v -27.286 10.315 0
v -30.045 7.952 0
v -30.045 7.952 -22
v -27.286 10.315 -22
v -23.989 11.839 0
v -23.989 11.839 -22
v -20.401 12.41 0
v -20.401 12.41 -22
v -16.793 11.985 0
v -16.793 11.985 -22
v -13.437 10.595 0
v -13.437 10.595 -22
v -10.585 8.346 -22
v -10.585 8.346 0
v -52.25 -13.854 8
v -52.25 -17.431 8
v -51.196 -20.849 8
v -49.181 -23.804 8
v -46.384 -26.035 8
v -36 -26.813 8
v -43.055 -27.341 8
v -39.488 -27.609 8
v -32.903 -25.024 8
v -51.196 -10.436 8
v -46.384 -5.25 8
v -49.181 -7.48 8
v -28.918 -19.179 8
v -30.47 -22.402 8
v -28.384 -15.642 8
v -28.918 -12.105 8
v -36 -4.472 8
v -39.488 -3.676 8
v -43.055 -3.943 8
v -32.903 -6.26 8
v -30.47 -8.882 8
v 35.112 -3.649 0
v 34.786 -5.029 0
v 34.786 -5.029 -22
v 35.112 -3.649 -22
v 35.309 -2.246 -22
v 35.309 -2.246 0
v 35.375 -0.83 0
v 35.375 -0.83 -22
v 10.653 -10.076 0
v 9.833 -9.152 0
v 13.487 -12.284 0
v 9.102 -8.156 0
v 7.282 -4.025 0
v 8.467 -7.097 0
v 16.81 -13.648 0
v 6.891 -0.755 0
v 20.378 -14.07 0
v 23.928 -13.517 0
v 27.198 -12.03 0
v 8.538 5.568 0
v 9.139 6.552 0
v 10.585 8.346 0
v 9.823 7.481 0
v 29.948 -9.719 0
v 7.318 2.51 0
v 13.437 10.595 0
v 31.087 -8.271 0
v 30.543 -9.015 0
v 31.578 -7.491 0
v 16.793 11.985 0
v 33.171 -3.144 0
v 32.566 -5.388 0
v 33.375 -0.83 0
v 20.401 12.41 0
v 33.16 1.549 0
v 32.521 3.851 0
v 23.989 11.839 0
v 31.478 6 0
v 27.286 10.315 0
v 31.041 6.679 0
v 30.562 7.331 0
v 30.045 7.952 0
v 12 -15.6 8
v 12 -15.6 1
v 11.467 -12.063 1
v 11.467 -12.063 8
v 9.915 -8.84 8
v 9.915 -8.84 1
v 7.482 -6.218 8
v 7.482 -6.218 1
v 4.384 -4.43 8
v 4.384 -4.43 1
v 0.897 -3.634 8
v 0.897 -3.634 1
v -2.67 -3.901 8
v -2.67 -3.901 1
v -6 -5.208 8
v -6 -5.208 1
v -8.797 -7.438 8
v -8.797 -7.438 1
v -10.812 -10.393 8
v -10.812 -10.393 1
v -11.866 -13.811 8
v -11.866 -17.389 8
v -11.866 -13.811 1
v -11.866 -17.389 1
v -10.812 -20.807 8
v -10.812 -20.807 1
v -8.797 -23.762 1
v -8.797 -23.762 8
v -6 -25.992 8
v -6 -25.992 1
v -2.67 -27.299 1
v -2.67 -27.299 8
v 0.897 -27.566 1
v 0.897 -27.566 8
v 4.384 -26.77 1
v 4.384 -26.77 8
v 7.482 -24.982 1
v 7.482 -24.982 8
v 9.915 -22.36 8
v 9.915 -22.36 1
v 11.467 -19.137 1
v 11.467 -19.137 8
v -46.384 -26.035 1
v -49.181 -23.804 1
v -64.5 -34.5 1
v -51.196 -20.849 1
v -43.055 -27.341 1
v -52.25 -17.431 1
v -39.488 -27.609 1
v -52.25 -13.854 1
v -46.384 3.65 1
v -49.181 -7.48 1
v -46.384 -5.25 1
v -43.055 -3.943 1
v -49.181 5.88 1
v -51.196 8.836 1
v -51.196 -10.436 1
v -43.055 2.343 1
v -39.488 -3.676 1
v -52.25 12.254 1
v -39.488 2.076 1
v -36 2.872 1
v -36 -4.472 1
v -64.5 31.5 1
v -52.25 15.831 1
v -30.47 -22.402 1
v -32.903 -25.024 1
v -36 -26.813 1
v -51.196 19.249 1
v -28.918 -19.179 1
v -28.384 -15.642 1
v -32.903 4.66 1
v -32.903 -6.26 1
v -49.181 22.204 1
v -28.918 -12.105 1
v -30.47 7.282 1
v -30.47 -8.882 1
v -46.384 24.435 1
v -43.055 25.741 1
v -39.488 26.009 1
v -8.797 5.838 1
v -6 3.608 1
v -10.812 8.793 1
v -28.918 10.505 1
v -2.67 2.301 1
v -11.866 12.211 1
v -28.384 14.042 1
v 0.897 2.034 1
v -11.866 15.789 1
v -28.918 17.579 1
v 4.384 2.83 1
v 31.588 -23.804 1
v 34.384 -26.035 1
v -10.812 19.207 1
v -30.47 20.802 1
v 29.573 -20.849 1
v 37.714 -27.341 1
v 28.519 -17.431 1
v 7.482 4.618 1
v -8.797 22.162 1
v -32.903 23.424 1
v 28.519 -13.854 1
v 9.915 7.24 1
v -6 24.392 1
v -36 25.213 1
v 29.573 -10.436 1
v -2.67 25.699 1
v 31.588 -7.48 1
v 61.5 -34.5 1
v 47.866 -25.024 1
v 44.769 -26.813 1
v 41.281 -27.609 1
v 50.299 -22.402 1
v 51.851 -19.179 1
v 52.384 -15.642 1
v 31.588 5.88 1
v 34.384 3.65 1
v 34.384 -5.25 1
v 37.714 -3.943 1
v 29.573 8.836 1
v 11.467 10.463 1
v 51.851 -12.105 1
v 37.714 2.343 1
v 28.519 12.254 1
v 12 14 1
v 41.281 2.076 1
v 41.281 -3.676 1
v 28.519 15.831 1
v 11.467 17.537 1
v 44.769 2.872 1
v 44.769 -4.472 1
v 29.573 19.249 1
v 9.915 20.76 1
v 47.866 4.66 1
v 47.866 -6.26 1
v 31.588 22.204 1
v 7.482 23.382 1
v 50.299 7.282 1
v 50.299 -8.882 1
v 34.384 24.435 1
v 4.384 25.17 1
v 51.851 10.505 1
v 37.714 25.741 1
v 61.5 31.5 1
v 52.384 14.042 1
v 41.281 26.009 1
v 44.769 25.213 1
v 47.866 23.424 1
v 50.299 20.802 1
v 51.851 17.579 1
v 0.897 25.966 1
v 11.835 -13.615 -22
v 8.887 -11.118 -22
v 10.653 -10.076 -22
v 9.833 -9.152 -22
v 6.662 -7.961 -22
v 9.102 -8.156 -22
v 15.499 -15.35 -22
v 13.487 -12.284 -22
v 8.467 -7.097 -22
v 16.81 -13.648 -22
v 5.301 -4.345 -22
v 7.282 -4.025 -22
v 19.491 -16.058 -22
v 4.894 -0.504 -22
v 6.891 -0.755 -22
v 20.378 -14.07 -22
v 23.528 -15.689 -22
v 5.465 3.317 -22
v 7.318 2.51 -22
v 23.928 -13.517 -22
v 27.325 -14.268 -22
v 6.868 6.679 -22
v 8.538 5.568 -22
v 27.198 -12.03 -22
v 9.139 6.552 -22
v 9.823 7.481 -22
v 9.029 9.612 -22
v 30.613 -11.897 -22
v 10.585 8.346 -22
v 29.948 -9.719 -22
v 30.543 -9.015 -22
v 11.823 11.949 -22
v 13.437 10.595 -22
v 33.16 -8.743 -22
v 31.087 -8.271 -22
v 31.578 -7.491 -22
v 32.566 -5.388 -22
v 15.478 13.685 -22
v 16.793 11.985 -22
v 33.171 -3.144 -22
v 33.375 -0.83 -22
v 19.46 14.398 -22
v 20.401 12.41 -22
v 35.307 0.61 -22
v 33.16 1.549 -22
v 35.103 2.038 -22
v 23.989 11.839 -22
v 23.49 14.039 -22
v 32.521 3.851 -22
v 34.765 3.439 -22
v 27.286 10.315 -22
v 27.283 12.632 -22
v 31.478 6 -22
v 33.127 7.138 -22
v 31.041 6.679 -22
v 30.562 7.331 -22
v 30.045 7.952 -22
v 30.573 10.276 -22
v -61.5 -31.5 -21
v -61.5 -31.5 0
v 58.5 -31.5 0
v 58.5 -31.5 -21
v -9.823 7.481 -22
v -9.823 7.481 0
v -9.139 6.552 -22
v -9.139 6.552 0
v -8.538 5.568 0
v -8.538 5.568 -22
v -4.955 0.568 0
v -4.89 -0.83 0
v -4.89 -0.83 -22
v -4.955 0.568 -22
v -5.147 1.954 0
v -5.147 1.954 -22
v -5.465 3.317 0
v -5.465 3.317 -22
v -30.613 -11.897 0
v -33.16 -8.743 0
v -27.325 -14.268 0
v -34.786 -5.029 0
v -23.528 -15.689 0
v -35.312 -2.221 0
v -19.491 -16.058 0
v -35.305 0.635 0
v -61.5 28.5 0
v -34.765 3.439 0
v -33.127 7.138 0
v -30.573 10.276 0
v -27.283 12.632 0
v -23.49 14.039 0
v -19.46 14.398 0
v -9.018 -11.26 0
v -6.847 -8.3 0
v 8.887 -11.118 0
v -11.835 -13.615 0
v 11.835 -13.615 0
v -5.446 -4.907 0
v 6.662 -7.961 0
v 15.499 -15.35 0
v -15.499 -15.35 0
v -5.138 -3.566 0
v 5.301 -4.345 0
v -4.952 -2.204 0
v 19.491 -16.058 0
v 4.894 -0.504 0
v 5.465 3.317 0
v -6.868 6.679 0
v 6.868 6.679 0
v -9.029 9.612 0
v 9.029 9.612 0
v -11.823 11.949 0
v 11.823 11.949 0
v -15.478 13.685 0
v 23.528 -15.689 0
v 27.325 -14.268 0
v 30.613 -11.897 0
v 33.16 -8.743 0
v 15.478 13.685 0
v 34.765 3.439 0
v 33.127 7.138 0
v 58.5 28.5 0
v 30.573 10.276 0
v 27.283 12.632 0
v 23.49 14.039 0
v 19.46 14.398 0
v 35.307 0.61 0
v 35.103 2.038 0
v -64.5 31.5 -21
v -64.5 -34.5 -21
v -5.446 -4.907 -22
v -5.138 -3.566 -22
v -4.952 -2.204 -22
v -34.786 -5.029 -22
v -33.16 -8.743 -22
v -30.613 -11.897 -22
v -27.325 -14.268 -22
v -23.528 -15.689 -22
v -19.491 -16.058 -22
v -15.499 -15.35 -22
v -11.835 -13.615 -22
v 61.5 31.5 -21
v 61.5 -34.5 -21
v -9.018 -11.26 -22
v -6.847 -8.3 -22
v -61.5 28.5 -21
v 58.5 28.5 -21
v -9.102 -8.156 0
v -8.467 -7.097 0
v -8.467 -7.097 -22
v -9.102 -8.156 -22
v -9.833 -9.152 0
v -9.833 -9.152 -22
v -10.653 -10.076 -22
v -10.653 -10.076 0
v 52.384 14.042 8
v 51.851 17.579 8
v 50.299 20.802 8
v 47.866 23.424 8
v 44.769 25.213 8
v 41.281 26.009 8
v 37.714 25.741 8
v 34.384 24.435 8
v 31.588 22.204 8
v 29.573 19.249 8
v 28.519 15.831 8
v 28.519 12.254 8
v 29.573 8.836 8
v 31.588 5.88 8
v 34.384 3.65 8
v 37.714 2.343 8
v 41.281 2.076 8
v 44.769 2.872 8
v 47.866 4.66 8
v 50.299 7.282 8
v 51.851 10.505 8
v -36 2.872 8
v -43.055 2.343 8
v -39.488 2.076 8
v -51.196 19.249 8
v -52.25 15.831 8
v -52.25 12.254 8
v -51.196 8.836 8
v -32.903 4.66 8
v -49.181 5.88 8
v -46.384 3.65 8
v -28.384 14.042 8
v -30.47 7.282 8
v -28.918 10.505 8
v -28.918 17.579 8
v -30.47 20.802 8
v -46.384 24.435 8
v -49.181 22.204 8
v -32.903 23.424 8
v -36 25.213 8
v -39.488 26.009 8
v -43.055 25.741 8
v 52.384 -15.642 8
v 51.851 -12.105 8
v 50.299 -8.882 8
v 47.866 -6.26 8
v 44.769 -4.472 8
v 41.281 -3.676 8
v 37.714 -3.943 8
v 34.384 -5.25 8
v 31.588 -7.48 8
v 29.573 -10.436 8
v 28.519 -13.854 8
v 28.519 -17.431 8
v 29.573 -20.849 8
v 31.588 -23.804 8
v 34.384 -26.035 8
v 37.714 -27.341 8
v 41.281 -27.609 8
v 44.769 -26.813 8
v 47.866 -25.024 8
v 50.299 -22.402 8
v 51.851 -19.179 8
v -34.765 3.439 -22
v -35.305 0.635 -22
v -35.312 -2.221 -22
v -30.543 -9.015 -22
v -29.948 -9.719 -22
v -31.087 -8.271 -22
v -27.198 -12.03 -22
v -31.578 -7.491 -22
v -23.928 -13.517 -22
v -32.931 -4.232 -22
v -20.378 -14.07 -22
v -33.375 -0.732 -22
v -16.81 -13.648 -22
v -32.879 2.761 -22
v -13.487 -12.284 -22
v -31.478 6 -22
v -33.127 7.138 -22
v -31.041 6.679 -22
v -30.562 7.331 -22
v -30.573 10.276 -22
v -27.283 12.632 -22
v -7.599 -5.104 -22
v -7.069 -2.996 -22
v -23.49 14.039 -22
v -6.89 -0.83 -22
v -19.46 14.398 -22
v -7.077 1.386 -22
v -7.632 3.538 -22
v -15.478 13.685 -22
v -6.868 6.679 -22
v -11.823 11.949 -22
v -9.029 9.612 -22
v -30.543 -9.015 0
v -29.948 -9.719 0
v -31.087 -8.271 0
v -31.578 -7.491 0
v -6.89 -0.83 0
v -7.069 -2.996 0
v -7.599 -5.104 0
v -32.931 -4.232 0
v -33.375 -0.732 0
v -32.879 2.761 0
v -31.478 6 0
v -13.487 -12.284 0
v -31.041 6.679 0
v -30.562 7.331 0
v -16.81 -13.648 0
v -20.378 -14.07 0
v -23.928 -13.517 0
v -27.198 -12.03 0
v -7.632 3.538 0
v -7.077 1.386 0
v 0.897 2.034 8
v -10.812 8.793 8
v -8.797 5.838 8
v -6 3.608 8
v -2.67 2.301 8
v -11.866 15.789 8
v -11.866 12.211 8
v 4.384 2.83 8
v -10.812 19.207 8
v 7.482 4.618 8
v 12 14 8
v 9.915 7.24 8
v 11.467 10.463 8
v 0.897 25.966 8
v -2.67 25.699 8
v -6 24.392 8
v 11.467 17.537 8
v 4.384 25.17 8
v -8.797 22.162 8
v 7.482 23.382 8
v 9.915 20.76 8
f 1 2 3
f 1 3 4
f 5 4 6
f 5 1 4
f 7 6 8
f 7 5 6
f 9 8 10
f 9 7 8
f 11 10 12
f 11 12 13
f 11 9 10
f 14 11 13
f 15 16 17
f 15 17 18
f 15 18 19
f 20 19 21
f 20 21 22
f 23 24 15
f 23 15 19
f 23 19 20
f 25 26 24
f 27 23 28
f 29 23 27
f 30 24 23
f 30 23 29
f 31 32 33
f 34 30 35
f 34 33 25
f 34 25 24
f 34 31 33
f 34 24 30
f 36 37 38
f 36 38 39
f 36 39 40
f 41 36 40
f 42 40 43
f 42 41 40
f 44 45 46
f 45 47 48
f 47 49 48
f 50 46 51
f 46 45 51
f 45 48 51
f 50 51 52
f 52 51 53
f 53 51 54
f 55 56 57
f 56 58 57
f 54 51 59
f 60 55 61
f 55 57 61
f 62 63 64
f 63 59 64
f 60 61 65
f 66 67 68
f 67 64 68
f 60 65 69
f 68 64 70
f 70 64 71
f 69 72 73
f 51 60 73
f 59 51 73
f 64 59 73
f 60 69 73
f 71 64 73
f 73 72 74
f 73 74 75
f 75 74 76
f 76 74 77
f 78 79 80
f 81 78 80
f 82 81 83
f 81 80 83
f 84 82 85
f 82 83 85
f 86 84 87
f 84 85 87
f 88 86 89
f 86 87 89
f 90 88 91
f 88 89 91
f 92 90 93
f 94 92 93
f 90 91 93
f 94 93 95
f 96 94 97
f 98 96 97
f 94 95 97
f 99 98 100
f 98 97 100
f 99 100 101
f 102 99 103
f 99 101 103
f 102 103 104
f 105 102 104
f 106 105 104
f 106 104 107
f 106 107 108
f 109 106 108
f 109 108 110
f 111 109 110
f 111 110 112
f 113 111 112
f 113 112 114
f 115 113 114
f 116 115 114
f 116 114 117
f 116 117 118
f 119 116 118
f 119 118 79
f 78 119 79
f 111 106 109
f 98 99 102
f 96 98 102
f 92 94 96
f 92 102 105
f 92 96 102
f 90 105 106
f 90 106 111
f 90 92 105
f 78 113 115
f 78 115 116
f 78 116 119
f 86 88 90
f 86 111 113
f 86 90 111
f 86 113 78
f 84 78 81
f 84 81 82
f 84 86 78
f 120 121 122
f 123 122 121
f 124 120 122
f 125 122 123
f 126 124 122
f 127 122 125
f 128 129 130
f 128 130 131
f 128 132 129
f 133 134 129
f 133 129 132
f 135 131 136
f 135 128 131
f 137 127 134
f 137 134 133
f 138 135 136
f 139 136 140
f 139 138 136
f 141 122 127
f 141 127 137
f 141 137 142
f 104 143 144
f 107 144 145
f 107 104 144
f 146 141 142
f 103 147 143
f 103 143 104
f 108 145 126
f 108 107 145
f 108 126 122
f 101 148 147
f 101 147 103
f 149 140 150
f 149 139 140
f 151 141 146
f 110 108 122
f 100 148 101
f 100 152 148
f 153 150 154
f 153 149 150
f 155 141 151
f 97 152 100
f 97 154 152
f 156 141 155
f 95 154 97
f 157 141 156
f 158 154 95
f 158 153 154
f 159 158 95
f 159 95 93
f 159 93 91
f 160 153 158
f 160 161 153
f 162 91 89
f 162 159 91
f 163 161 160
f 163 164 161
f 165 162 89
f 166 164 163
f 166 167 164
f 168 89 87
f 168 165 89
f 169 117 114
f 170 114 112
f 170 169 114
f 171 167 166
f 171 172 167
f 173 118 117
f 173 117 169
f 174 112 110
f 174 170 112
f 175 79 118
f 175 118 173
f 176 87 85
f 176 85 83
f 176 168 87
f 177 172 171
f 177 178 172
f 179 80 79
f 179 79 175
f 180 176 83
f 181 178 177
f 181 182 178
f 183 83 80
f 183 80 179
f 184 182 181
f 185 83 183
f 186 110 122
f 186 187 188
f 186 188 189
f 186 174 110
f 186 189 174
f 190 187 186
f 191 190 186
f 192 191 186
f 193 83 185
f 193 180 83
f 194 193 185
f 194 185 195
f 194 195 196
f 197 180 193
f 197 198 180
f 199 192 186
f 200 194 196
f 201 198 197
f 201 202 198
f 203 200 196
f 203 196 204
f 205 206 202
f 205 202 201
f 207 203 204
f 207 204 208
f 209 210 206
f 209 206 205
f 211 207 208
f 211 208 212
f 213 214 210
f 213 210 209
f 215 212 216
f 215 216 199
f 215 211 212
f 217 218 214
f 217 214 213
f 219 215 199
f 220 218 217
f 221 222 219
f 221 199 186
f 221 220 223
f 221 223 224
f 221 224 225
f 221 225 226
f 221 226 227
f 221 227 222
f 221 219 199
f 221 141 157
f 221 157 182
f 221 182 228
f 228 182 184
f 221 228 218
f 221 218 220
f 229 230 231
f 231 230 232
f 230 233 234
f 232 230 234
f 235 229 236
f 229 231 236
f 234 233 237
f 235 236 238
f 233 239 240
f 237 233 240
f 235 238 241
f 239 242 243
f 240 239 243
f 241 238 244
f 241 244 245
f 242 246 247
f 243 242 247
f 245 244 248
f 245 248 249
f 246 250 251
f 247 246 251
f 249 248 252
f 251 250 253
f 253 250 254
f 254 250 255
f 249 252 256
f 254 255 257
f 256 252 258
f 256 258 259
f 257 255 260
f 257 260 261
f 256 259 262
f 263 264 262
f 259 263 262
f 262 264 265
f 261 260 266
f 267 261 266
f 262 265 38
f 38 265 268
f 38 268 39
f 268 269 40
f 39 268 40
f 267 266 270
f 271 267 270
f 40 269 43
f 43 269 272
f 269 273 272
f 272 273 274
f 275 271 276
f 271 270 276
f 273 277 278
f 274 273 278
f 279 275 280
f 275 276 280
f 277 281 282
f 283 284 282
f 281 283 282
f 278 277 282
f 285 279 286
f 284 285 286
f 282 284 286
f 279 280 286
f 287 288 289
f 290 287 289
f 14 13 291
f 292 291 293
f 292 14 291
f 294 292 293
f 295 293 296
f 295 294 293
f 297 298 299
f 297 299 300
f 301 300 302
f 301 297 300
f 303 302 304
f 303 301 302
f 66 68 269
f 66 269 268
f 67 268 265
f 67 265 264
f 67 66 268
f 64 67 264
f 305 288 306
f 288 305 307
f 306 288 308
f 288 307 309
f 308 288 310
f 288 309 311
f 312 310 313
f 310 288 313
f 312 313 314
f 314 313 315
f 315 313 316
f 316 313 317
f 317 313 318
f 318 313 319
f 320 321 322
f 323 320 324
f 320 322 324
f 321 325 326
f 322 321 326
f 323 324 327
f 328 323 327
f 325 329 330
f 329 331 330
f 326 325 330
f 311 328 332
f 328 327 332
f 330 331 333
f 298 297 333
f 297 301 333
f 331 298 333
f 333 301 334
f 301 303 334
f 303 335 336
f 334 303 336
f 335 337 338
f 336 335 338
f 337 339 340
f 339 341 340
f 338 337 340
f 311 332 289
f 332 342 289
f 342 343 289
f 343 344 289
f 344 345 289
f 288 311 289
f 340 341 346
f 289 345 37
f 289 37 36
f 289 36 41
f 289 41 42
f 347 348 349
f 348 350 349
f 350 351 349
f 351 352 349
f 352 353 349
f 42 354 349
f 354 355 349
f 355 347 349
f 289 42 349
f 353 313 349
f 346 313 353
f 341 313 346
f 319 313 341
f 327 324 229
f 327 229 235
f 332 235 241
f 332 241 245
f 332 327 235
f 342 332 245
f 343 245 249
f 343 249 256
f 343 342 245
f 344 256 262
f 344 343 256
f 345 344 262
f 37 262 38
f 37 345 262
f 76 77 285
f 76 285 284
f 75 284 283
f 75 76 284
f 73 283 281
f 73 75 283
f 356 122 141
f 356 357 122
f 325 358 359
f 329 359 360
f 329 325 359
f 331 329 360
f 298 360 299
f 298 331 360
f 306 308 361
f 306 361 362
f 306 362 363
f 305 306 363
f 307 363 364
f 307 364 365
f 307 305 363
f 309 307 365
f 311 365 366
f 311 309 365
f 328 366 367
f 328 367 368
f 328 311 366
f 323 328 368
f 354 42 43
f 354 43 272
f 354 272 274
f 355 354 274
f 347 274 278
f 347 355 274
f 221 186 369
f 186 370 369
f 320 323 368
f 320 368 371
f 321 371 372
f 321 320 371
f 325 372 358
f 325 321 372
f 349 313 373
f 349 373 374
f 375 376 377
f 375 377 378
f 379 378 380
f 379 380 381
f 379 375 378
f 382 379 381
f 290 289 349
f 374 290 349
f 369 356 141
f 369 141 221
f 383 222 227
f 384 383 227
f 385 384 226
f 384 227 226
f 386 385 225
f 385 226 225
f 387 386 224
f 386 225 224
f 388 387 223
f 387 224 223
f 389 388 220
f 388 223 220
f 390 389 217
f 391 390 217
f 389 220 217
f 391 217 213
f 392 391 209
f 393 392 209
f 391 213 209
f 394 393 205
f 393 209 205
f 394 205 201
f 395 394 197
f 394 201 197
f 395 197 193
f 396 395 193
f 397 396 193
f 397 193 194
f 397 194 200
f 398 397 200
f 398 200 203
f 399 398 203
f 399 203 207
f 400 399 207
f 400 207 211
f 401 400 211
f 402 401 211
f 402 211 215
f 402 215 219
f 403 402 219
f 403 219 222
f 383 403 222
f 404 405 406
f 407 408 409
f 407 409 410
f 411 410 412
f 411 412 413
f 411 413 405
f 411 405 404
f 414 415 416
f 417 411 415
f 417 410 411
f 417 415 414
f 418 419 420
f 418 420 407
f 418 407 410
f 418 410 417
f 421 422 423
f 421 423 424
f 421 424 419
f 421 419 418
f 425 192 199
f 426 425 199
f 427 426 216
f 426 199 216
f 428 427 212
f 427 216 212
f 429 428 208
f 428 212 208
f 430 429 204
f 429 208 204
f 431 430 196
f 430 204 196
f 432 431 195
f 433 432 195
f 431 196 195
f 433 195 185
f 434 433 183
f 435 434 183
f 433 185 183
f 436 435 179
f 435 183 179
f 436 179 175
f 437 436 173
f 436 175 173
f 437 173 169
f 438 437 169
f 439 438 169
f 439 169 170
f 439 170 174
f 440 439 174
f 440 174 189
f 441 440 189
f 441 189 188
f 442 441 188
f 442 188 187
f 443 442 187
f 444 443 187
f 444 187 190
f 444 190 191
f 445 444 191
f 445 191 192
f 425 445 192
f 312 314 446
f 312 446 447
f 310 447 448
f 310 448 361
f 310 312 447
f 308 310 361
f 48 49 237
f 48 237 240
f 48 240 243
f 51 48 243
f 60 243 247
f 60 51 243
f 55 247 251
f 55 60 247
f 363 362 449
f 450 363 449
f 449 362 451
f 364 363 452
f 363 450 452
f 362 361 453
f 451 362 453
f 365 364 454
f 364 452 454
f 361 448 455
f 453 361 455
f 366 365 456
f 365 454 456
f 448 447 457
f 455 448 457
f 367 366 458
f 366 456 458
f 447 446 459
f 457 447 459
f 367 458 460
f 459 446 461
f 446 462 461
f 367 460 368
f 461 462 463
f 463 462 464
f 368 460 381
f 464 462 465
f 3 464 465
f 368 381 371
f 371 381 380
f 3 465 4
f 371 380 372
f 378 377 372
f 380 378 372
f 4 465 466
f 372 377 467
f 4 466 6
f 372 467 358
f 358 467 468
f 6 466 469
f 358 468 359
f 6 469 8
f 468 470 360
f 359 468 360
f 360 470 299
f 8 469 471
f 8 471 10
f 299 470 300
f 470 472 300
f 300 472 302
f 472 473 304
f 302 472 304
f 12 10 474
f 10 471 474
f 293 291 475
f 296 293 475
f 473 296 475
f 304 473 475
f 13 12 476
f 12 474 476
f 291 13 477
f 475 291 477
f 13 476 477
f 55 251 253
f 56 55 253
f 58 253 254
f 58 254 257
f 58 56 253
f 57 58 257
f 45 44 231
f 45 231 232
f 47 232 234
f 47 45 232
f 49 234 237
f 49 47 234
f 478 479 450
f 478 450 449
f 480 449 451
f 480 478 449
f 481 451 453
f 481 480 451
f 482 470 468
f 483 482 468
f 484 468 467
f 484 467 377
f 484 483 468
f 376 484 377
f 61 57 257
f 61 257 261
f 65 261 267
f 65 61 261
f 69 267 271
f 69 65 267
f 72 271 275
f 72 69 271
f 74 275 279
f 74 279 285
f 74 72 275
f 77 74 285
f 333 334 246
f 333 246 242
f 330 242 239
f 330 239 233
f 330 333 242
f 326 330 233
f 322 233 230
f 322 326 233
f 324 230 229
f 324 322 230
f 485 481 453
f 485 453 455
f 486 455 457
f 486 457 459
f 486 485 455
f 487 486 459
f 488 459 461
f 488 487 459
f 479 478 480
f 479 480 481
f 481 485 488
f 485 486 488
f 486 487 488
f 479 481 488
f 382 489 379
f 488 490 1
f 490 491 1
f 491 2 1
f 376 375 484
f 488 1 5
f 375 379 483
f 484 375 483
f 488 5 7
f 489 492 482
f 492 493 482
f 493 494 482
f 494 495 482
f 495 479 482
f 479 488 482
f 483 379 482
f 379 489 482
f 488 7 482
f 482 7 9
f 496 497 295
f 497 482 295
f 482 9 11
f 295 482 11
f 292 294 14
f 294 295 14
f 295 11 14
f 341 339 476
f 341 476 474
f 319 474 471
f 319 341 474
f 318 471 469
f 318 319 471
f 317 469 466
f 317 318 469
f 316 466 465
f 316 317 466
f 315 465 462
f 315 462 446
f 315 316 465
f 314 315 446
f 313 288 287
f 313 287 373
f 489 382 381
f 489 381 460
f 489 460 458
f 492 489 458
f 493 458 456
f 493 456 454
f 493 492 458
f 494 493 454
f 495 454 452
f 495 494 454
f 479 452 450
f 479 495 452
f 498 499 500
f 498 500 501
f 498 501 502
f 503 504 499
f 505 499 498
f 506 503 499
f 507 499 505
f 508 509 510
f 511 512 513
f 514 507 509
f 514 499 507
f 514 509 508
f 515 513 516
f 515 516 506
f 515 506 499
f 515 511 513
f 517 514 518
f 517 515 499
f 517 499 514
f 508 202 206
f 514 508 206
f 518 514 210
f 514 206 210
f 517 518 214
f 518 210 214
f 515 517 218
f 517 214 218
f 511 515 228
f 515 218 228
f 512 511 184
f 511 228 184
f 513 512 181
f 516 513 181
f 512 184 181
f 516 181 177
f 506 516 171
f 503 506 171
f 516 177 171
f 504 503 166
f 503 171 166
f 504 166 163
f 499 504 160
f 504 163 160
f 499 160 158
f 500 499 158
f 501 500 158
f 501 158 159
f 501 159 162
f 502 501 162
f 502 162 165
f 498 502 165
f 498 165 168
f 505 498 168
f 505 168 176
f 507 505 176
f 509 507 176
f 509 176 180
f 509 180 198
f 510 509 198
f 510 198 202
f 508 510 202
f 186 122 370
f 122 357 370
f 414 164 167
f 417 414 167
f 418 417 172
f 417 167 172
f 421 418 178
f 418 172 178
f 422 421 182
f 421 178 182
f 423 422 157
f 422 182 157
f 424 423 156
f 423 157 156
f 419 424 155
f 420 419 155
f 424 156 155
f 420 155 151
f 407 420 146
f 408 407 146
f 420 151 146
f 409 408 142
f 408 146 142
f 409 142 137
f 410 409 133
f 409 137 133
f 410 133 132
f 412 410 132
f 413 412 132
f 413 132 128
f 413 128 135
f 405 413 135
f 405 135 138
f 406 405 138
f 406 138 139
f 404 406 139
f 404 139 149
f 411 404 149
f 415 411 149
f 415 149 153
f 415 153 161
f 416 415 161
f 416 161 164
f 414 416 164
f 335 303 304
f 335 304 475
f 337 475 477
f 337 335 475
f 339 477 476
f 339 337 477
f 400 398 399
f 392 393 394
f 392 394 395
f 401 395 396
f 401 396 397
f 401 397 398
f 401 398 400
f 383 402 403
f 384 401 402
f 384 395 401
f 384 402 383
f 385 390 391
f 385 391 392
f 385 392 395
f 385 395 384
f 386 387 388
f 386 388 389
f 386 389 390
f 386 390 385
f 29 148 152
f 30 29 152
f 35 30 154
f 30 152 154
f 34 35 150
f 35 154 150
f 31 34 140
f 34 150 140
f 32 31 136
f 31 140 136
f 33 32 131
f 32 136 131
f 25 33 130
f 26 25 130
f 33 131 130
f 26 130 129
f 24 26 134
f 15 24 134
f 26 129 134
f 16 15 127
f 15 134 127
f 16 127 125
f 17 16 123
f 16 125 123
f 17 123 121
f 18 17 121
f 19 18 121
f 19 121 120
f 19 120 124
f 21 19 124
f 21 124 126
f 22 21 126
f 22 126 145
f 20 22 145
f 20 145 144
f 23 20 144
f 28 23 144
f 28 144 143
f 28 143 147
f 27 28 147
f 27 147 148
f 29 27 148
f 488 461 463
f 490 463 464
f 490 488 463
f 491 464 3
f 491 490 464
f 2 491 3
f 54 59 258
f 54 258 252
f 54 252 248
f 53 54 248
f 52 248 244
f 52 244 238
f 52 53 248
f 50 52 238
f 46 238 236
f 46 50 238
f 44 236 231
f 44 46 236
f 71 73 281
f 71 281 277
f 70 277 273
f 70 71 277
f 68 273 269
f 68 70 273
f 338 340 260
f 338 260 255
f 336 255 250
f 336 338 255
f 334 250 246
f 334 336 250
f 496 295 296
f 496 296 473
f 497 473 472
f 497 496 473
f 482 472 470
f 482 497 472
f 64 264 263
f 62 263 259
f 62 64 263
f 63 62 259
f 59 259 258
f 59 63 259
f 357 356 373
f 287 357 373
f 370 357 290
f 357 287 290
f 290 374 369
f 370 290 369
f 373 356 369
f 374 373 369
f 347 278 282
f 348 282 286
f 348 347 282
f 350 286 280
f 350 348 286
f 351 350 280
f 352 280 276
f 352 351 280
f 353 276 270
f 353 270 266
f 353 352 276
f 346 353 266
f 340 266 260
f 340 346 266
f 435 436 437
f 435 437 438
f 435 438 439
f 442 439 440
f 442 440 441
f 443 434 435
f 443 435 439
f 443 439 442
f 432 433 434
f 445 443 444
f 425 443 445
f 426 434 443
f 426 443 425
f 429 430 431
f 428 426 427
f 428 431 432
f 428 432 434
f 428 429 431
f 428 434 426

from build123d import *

# Parameters (mm, degrees)
F0_W     = 126
F0_H     = 66
F0_W_2   = 120
F0_H_2   = 60
F1_DEPTH = 21
F2_W     = 126
F2_H     = 66
F3_DEPTH = 1
F0_R     = 12
F4_DEPTH = 8
F6_DEPTH = 22


with BuildPart() as f1:
    # F0 (on Top) → F1 (new body)
    with BuildSketch(Plane.XY):
        with Locations((-1.5, -1.5)):
            Rectangle(F0_W, F0_H)
        with Locations((-1.5, -1.5)):
            Rectangle(F0_W_2, F0_H_2, mode=Mode.SUBTRACT)
    extrude(amount=-F1_DEPTH)

    # F2 (on face) → F3 (join)
    with BuildSketch(Plane.XY):
        with Locations((-1.5, -1.5)):
            Rectangle(F2_W, F2_H)
    extrude(amount=F3_DEPTH)

    # F0 (on Top) → F4 (join)
    with BuildSketch(Plane.XY):
        with Locations((-40.3844975889, 14.0422494113)):
            Circle(F0_R)
        with Locations((0, 14)):
            Circle(F0_R)
        with Locations((-40.3844975889, -15.6422494113)):
            Circle(F0_R)
        with Locations((0, -15.6)):
            Circle(F0_R)
        with Locations((40.3844975889, -15.6422494113)):
            Circle(F0_R)
        with Locations((40.3844975889, 14.0422494113)):
            Circle(F0_R)
    extrude(amount=F4_DEPTH)

    # F5 (on face) → F6 (join)
    with BuildSketch(Plane.XY):
        with BuildLine():
            ThreePointArc((31.4784805761, 5.99968384), (32.8922690999, 2.7143222033), (33.3752768321, -0.8295602165))
            ThreePointArc((33.3752768321, -0.8295602165), (32.9180007232, -4.2794585958), (31.5777529034, -7.4910993057))
            ThreePointArc((31.5777529034, -7.4910993057), (33.0771463209, -6.123708691), (34.7855065256, -5.0285177832))
            ThreePointArc((34.7855065256, -5.0285177832), (35.2271141548, -2.9496471052), (35.3752768321, -0.8295602165))
            ThreePointArc((35.3752768321, -0.8295602165), (35.2220188743, 1.3264920966), (34.7653269231, 3.4391875409))
            ThreePointArc((34.7653269231, 3.4391875409), (33.0099261031, 4.57569273), (31.4784805761, 5.99968384))
        make_face()
        with BuildLine():
            ThreePointArc((30.044931449, 7.9518165828), (30.8064288175, 7.0085924135), (31.4784805761, 5.99968384))
            ThreePointArc((31.4784805761, 5.99968384), (33.0099261031, 4.57569273), (34.7653269231, 3.4391875409))
            ThreePointArc((34.7653269231, 3.4391875409), (32.4184567267, 8.1923854782), (28.5856333111, 11.8543733283))
            ThreePointArc((28.5856333111, 11.8543733283), (29.1446126861, 9.8392757768), (30.044931449, 7.9518165828))
        make_face()
        with BuildLine():
            ThreePointArc((34.7855065256, -5.0285177832), (33.0771463209, -6.123708691), (31.5777529034, -7.4910993057))
            ThreePointArc((31.5777529034, -7.4910993057), (30.8212956484, -8.6474276201), (29.948463719, -9.718635897))
            ThreePointArc((29.948463719, -9.718635897), (29.0995516946, -11.5618087289), (28.5733528944, -13.5216690648))
            ThreePointArc((28.5733528944, -13.5216690648), (32.4355688891, -9.8281570151), (34.7855065256, -5.0285177832))
        make_face()
        with BuildLine():
            ThreePointArc((10.5845976874, 8.3461259481), (20.4011056558, 12.410159384), (30.044931449, 7.9518165828))
            ThreePointArc((30.044931449, 7.9518165828), (29.1446126861, 9.8392757768), (28.5856333111, 11.8543733283))
            ThreePointArc((28.5856333111, 11.8543733283), (20.2186418923, 14.4126354365), (11.8233794228, 11.9487323369))
            ThreePointArc((11.8233794228, 11.9487323369), (11.3478655588, 10.0979560153), (10.5845976874, 8.3461259481))
        make_face()
        with BuildLine():
            ThreePointArc((28.5733528944, -13.5216690648), (29.0995516946, -11.5618087289), (29.948463719, -9.718635897))
            ThreePointArc((29.948463719, -9.718635897), (20.3778358891, -14.0697308571), (10.652789482, -10.0756831869))
            ThreePointArc((10.652789482, -10.0756831869), (11.3821848264, -11.7992278973), (11.8347224415, -13.615221742))
            ThreePointArc((11.8347224415, -13.615221742), (20.2180287599, -16.0717593087), (28.5733528944, -13.5216690648))
        make_face()
        with BuildLine():
            ThreePointArc((8.5383868776, 5.5681585921), (9.4706325231, 7.0240682624), (10.5845976874, 8.3461259481))
            ThreePointArc((10.5845976874, 8.3461259481), (11.3478655588, 10.0979560153), (11.8233794228, 11.9487323369))
            ThreePointArc((11.8233794228, 11.9487323369), (7.86032363, 8.2101986383), (5.4651898622, 3.3167561214))
            ThreePointArc((5.4651898622, 3.3167561214), (7.0917024506, 4.3197233329), (8.5383868776, 5.5681585921))
        make_face()
        with BuildLine():
            ThreePointArc((11.8347224415, -13.615221742), (11.3821848264, -11.7992278973), (10.652789482, -10.0756831869))
            ThreePointArc((10.652789482, -10.0756831869), (9.455680238, -8.6628486697), (8.46736073, -7.0968357497))
            ThreePointArc((8.46736073, -7.0968357497), (7.0422594659, -5.8836950637), (5.4458638506, -4.9068916156))
            ThreePointArc((5.4458638506, -4.9068916156), (7.8431131072, -9.8459070996), (11.8347224415, -13.615221742))
        make_face()
        with BuildLine():
            ThreePointArc((8.46736073, -7.0968357497), (6.8906107626, -0.7552968983), (8.5383868776, 5.5681585921))
            ThreePointArc((8.5383868776, 5.5681585921), (7.0917024506, 4.3197233329), (5.4651898622, 3.3167561214))
            ThreePointArc((5.4651898622, 3.3167561214), (4.8904446173, -0.7937397736), (5.4458638506, -4.9068916156))
            ThreePointArc((5.4458638506, -4.9068916156), (7.0422594659, -5.8836950637), (8.46736073, -7.0968357497))
        make_face()
        with BuildLine():
            ThreePointArc((-8.5383868776, 5.5681585921), (-7.0917024506, 4.3197233329), (-5.4651898622, 3.3167561214))
            ThreePointArc((-5.4651898622, 3.3167561214), (-7.86032363, 8.2101986383), (-11.8233794228, 11.9487323369))
            ThreePointArc((-11.8233794228, 11.9487323369), (-11.3478655588, 10.0979560153), (-10.5845976874, 8.3461259481))
            ThreePointArc((-10.5845976874, 8.3461259481), (-9.4706325231, 7.0240682624), (-8.5383868776, 5.5681585921))
        make_face()
        with BuildLine():
            ThreePointArc((-4.8904025274, -0.8295602165), (-5.034783168, 1.2634232792), (-5.4651898622, 3.3167561214))
            ThreePointArc((-5.4651898622, 3.3167561214), (-7.0917024506, 4.3197233329), (-8.5383868776, 5.5681585921))
            ThreePointArc((-8.5383868776, 5.5681585921), (-7.3090150887, 2.4737206667), (-6.8904025274, -0.8295602165))
            ThreePointArc((-6.8904025274, -0.8295602165), (-7.2906920093, -4.0608734086), (-8.46736073, -7.0968357497))
            ThreePointArc((-8.46736073, -7.0968357497), (-7.0422594659, -5.8836950637), (-5.4458638506, -4.9068916156))
            ThreePointArc((-5.4458638506, -4.9068916156), (-5.0299062498, -2.8870567912), (-4.8904025274, -0.8295602165))
        make_face()
        with BuildLine():
            ThreePointArc((-10.5845976874, 8.3461259481), (-11.3478655588, 10.0979560153), (-11.8233794228, 11.9487323369))
            ThreePointArc((-11.8233794228, 11.9487323369), (-20.2186418923, 14.4126354365), (-28.5856333111, 11.8543733283))
            ThreePointArc((-28.5856333111, 11.8543733283), (-29.1446126861, 9.8392757768), (-30.044931449, 7.9518165828))
            ThreePointArc((-30.044931449, 7.9518165828), (-20.4011056558, 12.410159384), (-10.5845976874, 8.3461259481))
        make_face()
        with BuildLine():
            ThreePointArc((-11.8347224415, -13.615221742), (-7.8431131072, -9.8459070996), (-5.4458638506, -4.9068916156))
            ThreePointArc((-5.4458638506, -4.9068916156), (-7.0422594659, -5.8836950637), (-8.46736073, -7.0968357497))
            ThreePointArc((-8.46736073, -7.0968357497), (-9.455680238, -8.6628486697), (-10.652789482, -10.0756831869))
            ThreePointArc((-10.652789482, -10.0756831869), (-11.3821848264, -11.7992278973), (-11.8347224415, -13.615221742))
        make_face()
        with BuildLine():
            ThreePointArc((-28.5733528944, -13.5216690648), (-20.2180287599, -16.0717593087), (-11.8347224415, -13.615221742))
            ThreePointArc((-11.8347224415, -13.615221742), (-11.3821848264, -11.7992278973), (-10.652789482, -10.0756831869))
            ThreePointArc((-10.652789482, -10.0756831869), (-20.3778358891, -14.0697308571), (-29.948463719, -9.718635897))
            ThreePointArc((-29.948463719, -9.718635897), (-29.0995516946, -11.5618087289), (-28.5733528944, -13.5216690648))
        make_face()
        with BuildLine():
            ThreePointArc((-30.044931449, 7.9518165828), (-29.1446126861, 9.8392757768), (-28.5856333111, 11.8543733283))
            ThreePointArc((-28.5856333111, 11.8543733283), (-32.4184567267, 8.1923854782), (-34.7653269231, 3.4391875409))
            ThreePointArc((-34.7653269231, 3.4391875409), (-33.0099261031, 4.57569273), (-31.4784805761, 5.99968384))
            ThreePointArc((-31.4784805761, 5.99968384), (-30.8064288175, 7.0085924135), (-30.044931449, 7.9518165828))
        make_face()
        with BuildLine():
            ThreePointArc((-34.7855065256, -5.0285177832), (-32.4355688891, -9.8281570151), (-28.5733528944, -13.5216690648))
            ThreePointArc((-28.5733528944, -13.5216690648), (-29.0995516946, -11.5618087289), (-29.948463719, -9.718635897))
            ThreePointArc((-29.948463719, -9.718635897), (-30.8212956484, -8.6474276201), (-31.5777529034, -7.4910993057))
            ThreePointArc((-31.5777529034, -7.4910993057), (-33.0771463209, -6.123708691), (-34.7855065256, -5.0285177832))
        make_face()
        with BuildLine():
            ThreePointArc((-31.4784805761, 5.99968384), (-33.0099261031, 4.57569273), (-34.7653269231, 3.4391875409))
            ThreePointArc((-34.7653269231, 3.4391875409), (-35.3752335492, -0.7932356825), (-34.7855065256, -5.0285177832))
            ThreePointArc((-34.7855065256, -5.0285177832), (-33.0771463209, -6.123708691), (-31.5777529034, -7.4910993057))
            ThreePointArc((-31.5777529034, -7.4910993057), (-33.3749183212, -0.7321179887), (-31.4784805761, 5.99968384))
        make_face()
    extrude(amount=-F6_DEPTH)


solid = f1.part
